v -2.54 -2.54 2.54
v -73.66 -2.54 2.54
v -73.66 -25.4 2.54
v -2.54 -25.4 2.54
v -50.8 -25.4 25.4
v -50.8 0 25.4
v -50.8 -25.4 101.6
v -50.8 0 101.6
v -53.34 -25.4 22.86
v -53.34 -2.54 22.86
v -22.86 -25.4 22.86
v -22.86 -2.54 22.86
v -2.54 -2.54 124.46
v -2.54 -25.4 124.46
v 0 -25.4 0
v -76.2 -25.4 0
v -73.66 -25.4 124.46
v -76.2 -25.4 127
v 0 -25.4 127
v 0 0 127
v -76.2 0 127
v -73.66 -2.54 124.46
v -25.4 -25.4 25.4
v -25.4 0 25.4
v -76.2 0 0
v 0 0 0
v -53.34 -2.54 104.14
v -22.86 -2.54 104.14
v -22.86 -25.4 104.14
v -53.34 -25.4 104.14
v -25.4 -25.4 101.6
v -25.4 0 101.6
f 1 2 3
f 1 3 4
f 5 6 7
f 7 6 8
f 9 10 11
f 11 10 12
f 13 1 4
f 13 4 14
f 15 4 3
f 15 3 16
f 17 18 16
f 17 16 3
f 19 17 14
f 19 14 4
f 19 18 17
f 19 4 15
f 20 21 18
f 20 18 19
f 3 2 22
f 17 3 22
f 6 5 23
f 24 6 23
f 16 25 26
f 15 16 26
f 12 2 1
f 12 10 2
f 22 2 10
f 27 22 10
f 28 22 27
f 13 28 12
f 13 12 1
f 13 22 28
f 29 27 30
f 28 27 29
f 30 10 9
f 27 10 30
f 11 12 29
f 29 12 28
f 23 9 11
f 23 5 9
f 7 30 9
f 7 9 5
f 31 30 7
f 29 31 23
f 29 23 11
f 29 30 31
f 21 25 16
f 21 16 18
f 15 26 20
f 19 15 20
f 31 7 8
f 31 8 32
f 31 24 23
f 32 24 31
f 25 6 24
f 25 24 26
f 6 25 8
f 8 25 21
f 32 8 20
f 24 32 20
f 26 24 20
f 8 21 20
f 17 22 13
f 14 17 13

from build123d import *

# Parameters (mm, degrees)
F0_W     = 76.2
F0_H     = 127
F0_W_2   = 25.4
F0_H_2   = 76.2
F1_DEPTH = 25.4
F2_T     = -2.54


with BuildPart() as f1:
    # F0 (on Front) → F1 (new body)
    with BuildSketch(Plane.XZ):
        with Locations((-38.1, 63.5)):
            Rectangle(F0_W, F0_H)
        with Locations((-38.1, 63.5)):
            Rectangle(F0_W_2, F0_H_2, mode=Mode.SUBTRACT)
    extrude(amount=F1_DEPTH)

    # F2
    f2_openings = [f1.faces().sort_by_distance(p)[0] for p in [
        (-38.1, -25.4, 1.481062),
    ]]
    offset(amount=F2_T, openings=f2_openings, kind=Kind.INTERSECTION)


solid = f1.part
